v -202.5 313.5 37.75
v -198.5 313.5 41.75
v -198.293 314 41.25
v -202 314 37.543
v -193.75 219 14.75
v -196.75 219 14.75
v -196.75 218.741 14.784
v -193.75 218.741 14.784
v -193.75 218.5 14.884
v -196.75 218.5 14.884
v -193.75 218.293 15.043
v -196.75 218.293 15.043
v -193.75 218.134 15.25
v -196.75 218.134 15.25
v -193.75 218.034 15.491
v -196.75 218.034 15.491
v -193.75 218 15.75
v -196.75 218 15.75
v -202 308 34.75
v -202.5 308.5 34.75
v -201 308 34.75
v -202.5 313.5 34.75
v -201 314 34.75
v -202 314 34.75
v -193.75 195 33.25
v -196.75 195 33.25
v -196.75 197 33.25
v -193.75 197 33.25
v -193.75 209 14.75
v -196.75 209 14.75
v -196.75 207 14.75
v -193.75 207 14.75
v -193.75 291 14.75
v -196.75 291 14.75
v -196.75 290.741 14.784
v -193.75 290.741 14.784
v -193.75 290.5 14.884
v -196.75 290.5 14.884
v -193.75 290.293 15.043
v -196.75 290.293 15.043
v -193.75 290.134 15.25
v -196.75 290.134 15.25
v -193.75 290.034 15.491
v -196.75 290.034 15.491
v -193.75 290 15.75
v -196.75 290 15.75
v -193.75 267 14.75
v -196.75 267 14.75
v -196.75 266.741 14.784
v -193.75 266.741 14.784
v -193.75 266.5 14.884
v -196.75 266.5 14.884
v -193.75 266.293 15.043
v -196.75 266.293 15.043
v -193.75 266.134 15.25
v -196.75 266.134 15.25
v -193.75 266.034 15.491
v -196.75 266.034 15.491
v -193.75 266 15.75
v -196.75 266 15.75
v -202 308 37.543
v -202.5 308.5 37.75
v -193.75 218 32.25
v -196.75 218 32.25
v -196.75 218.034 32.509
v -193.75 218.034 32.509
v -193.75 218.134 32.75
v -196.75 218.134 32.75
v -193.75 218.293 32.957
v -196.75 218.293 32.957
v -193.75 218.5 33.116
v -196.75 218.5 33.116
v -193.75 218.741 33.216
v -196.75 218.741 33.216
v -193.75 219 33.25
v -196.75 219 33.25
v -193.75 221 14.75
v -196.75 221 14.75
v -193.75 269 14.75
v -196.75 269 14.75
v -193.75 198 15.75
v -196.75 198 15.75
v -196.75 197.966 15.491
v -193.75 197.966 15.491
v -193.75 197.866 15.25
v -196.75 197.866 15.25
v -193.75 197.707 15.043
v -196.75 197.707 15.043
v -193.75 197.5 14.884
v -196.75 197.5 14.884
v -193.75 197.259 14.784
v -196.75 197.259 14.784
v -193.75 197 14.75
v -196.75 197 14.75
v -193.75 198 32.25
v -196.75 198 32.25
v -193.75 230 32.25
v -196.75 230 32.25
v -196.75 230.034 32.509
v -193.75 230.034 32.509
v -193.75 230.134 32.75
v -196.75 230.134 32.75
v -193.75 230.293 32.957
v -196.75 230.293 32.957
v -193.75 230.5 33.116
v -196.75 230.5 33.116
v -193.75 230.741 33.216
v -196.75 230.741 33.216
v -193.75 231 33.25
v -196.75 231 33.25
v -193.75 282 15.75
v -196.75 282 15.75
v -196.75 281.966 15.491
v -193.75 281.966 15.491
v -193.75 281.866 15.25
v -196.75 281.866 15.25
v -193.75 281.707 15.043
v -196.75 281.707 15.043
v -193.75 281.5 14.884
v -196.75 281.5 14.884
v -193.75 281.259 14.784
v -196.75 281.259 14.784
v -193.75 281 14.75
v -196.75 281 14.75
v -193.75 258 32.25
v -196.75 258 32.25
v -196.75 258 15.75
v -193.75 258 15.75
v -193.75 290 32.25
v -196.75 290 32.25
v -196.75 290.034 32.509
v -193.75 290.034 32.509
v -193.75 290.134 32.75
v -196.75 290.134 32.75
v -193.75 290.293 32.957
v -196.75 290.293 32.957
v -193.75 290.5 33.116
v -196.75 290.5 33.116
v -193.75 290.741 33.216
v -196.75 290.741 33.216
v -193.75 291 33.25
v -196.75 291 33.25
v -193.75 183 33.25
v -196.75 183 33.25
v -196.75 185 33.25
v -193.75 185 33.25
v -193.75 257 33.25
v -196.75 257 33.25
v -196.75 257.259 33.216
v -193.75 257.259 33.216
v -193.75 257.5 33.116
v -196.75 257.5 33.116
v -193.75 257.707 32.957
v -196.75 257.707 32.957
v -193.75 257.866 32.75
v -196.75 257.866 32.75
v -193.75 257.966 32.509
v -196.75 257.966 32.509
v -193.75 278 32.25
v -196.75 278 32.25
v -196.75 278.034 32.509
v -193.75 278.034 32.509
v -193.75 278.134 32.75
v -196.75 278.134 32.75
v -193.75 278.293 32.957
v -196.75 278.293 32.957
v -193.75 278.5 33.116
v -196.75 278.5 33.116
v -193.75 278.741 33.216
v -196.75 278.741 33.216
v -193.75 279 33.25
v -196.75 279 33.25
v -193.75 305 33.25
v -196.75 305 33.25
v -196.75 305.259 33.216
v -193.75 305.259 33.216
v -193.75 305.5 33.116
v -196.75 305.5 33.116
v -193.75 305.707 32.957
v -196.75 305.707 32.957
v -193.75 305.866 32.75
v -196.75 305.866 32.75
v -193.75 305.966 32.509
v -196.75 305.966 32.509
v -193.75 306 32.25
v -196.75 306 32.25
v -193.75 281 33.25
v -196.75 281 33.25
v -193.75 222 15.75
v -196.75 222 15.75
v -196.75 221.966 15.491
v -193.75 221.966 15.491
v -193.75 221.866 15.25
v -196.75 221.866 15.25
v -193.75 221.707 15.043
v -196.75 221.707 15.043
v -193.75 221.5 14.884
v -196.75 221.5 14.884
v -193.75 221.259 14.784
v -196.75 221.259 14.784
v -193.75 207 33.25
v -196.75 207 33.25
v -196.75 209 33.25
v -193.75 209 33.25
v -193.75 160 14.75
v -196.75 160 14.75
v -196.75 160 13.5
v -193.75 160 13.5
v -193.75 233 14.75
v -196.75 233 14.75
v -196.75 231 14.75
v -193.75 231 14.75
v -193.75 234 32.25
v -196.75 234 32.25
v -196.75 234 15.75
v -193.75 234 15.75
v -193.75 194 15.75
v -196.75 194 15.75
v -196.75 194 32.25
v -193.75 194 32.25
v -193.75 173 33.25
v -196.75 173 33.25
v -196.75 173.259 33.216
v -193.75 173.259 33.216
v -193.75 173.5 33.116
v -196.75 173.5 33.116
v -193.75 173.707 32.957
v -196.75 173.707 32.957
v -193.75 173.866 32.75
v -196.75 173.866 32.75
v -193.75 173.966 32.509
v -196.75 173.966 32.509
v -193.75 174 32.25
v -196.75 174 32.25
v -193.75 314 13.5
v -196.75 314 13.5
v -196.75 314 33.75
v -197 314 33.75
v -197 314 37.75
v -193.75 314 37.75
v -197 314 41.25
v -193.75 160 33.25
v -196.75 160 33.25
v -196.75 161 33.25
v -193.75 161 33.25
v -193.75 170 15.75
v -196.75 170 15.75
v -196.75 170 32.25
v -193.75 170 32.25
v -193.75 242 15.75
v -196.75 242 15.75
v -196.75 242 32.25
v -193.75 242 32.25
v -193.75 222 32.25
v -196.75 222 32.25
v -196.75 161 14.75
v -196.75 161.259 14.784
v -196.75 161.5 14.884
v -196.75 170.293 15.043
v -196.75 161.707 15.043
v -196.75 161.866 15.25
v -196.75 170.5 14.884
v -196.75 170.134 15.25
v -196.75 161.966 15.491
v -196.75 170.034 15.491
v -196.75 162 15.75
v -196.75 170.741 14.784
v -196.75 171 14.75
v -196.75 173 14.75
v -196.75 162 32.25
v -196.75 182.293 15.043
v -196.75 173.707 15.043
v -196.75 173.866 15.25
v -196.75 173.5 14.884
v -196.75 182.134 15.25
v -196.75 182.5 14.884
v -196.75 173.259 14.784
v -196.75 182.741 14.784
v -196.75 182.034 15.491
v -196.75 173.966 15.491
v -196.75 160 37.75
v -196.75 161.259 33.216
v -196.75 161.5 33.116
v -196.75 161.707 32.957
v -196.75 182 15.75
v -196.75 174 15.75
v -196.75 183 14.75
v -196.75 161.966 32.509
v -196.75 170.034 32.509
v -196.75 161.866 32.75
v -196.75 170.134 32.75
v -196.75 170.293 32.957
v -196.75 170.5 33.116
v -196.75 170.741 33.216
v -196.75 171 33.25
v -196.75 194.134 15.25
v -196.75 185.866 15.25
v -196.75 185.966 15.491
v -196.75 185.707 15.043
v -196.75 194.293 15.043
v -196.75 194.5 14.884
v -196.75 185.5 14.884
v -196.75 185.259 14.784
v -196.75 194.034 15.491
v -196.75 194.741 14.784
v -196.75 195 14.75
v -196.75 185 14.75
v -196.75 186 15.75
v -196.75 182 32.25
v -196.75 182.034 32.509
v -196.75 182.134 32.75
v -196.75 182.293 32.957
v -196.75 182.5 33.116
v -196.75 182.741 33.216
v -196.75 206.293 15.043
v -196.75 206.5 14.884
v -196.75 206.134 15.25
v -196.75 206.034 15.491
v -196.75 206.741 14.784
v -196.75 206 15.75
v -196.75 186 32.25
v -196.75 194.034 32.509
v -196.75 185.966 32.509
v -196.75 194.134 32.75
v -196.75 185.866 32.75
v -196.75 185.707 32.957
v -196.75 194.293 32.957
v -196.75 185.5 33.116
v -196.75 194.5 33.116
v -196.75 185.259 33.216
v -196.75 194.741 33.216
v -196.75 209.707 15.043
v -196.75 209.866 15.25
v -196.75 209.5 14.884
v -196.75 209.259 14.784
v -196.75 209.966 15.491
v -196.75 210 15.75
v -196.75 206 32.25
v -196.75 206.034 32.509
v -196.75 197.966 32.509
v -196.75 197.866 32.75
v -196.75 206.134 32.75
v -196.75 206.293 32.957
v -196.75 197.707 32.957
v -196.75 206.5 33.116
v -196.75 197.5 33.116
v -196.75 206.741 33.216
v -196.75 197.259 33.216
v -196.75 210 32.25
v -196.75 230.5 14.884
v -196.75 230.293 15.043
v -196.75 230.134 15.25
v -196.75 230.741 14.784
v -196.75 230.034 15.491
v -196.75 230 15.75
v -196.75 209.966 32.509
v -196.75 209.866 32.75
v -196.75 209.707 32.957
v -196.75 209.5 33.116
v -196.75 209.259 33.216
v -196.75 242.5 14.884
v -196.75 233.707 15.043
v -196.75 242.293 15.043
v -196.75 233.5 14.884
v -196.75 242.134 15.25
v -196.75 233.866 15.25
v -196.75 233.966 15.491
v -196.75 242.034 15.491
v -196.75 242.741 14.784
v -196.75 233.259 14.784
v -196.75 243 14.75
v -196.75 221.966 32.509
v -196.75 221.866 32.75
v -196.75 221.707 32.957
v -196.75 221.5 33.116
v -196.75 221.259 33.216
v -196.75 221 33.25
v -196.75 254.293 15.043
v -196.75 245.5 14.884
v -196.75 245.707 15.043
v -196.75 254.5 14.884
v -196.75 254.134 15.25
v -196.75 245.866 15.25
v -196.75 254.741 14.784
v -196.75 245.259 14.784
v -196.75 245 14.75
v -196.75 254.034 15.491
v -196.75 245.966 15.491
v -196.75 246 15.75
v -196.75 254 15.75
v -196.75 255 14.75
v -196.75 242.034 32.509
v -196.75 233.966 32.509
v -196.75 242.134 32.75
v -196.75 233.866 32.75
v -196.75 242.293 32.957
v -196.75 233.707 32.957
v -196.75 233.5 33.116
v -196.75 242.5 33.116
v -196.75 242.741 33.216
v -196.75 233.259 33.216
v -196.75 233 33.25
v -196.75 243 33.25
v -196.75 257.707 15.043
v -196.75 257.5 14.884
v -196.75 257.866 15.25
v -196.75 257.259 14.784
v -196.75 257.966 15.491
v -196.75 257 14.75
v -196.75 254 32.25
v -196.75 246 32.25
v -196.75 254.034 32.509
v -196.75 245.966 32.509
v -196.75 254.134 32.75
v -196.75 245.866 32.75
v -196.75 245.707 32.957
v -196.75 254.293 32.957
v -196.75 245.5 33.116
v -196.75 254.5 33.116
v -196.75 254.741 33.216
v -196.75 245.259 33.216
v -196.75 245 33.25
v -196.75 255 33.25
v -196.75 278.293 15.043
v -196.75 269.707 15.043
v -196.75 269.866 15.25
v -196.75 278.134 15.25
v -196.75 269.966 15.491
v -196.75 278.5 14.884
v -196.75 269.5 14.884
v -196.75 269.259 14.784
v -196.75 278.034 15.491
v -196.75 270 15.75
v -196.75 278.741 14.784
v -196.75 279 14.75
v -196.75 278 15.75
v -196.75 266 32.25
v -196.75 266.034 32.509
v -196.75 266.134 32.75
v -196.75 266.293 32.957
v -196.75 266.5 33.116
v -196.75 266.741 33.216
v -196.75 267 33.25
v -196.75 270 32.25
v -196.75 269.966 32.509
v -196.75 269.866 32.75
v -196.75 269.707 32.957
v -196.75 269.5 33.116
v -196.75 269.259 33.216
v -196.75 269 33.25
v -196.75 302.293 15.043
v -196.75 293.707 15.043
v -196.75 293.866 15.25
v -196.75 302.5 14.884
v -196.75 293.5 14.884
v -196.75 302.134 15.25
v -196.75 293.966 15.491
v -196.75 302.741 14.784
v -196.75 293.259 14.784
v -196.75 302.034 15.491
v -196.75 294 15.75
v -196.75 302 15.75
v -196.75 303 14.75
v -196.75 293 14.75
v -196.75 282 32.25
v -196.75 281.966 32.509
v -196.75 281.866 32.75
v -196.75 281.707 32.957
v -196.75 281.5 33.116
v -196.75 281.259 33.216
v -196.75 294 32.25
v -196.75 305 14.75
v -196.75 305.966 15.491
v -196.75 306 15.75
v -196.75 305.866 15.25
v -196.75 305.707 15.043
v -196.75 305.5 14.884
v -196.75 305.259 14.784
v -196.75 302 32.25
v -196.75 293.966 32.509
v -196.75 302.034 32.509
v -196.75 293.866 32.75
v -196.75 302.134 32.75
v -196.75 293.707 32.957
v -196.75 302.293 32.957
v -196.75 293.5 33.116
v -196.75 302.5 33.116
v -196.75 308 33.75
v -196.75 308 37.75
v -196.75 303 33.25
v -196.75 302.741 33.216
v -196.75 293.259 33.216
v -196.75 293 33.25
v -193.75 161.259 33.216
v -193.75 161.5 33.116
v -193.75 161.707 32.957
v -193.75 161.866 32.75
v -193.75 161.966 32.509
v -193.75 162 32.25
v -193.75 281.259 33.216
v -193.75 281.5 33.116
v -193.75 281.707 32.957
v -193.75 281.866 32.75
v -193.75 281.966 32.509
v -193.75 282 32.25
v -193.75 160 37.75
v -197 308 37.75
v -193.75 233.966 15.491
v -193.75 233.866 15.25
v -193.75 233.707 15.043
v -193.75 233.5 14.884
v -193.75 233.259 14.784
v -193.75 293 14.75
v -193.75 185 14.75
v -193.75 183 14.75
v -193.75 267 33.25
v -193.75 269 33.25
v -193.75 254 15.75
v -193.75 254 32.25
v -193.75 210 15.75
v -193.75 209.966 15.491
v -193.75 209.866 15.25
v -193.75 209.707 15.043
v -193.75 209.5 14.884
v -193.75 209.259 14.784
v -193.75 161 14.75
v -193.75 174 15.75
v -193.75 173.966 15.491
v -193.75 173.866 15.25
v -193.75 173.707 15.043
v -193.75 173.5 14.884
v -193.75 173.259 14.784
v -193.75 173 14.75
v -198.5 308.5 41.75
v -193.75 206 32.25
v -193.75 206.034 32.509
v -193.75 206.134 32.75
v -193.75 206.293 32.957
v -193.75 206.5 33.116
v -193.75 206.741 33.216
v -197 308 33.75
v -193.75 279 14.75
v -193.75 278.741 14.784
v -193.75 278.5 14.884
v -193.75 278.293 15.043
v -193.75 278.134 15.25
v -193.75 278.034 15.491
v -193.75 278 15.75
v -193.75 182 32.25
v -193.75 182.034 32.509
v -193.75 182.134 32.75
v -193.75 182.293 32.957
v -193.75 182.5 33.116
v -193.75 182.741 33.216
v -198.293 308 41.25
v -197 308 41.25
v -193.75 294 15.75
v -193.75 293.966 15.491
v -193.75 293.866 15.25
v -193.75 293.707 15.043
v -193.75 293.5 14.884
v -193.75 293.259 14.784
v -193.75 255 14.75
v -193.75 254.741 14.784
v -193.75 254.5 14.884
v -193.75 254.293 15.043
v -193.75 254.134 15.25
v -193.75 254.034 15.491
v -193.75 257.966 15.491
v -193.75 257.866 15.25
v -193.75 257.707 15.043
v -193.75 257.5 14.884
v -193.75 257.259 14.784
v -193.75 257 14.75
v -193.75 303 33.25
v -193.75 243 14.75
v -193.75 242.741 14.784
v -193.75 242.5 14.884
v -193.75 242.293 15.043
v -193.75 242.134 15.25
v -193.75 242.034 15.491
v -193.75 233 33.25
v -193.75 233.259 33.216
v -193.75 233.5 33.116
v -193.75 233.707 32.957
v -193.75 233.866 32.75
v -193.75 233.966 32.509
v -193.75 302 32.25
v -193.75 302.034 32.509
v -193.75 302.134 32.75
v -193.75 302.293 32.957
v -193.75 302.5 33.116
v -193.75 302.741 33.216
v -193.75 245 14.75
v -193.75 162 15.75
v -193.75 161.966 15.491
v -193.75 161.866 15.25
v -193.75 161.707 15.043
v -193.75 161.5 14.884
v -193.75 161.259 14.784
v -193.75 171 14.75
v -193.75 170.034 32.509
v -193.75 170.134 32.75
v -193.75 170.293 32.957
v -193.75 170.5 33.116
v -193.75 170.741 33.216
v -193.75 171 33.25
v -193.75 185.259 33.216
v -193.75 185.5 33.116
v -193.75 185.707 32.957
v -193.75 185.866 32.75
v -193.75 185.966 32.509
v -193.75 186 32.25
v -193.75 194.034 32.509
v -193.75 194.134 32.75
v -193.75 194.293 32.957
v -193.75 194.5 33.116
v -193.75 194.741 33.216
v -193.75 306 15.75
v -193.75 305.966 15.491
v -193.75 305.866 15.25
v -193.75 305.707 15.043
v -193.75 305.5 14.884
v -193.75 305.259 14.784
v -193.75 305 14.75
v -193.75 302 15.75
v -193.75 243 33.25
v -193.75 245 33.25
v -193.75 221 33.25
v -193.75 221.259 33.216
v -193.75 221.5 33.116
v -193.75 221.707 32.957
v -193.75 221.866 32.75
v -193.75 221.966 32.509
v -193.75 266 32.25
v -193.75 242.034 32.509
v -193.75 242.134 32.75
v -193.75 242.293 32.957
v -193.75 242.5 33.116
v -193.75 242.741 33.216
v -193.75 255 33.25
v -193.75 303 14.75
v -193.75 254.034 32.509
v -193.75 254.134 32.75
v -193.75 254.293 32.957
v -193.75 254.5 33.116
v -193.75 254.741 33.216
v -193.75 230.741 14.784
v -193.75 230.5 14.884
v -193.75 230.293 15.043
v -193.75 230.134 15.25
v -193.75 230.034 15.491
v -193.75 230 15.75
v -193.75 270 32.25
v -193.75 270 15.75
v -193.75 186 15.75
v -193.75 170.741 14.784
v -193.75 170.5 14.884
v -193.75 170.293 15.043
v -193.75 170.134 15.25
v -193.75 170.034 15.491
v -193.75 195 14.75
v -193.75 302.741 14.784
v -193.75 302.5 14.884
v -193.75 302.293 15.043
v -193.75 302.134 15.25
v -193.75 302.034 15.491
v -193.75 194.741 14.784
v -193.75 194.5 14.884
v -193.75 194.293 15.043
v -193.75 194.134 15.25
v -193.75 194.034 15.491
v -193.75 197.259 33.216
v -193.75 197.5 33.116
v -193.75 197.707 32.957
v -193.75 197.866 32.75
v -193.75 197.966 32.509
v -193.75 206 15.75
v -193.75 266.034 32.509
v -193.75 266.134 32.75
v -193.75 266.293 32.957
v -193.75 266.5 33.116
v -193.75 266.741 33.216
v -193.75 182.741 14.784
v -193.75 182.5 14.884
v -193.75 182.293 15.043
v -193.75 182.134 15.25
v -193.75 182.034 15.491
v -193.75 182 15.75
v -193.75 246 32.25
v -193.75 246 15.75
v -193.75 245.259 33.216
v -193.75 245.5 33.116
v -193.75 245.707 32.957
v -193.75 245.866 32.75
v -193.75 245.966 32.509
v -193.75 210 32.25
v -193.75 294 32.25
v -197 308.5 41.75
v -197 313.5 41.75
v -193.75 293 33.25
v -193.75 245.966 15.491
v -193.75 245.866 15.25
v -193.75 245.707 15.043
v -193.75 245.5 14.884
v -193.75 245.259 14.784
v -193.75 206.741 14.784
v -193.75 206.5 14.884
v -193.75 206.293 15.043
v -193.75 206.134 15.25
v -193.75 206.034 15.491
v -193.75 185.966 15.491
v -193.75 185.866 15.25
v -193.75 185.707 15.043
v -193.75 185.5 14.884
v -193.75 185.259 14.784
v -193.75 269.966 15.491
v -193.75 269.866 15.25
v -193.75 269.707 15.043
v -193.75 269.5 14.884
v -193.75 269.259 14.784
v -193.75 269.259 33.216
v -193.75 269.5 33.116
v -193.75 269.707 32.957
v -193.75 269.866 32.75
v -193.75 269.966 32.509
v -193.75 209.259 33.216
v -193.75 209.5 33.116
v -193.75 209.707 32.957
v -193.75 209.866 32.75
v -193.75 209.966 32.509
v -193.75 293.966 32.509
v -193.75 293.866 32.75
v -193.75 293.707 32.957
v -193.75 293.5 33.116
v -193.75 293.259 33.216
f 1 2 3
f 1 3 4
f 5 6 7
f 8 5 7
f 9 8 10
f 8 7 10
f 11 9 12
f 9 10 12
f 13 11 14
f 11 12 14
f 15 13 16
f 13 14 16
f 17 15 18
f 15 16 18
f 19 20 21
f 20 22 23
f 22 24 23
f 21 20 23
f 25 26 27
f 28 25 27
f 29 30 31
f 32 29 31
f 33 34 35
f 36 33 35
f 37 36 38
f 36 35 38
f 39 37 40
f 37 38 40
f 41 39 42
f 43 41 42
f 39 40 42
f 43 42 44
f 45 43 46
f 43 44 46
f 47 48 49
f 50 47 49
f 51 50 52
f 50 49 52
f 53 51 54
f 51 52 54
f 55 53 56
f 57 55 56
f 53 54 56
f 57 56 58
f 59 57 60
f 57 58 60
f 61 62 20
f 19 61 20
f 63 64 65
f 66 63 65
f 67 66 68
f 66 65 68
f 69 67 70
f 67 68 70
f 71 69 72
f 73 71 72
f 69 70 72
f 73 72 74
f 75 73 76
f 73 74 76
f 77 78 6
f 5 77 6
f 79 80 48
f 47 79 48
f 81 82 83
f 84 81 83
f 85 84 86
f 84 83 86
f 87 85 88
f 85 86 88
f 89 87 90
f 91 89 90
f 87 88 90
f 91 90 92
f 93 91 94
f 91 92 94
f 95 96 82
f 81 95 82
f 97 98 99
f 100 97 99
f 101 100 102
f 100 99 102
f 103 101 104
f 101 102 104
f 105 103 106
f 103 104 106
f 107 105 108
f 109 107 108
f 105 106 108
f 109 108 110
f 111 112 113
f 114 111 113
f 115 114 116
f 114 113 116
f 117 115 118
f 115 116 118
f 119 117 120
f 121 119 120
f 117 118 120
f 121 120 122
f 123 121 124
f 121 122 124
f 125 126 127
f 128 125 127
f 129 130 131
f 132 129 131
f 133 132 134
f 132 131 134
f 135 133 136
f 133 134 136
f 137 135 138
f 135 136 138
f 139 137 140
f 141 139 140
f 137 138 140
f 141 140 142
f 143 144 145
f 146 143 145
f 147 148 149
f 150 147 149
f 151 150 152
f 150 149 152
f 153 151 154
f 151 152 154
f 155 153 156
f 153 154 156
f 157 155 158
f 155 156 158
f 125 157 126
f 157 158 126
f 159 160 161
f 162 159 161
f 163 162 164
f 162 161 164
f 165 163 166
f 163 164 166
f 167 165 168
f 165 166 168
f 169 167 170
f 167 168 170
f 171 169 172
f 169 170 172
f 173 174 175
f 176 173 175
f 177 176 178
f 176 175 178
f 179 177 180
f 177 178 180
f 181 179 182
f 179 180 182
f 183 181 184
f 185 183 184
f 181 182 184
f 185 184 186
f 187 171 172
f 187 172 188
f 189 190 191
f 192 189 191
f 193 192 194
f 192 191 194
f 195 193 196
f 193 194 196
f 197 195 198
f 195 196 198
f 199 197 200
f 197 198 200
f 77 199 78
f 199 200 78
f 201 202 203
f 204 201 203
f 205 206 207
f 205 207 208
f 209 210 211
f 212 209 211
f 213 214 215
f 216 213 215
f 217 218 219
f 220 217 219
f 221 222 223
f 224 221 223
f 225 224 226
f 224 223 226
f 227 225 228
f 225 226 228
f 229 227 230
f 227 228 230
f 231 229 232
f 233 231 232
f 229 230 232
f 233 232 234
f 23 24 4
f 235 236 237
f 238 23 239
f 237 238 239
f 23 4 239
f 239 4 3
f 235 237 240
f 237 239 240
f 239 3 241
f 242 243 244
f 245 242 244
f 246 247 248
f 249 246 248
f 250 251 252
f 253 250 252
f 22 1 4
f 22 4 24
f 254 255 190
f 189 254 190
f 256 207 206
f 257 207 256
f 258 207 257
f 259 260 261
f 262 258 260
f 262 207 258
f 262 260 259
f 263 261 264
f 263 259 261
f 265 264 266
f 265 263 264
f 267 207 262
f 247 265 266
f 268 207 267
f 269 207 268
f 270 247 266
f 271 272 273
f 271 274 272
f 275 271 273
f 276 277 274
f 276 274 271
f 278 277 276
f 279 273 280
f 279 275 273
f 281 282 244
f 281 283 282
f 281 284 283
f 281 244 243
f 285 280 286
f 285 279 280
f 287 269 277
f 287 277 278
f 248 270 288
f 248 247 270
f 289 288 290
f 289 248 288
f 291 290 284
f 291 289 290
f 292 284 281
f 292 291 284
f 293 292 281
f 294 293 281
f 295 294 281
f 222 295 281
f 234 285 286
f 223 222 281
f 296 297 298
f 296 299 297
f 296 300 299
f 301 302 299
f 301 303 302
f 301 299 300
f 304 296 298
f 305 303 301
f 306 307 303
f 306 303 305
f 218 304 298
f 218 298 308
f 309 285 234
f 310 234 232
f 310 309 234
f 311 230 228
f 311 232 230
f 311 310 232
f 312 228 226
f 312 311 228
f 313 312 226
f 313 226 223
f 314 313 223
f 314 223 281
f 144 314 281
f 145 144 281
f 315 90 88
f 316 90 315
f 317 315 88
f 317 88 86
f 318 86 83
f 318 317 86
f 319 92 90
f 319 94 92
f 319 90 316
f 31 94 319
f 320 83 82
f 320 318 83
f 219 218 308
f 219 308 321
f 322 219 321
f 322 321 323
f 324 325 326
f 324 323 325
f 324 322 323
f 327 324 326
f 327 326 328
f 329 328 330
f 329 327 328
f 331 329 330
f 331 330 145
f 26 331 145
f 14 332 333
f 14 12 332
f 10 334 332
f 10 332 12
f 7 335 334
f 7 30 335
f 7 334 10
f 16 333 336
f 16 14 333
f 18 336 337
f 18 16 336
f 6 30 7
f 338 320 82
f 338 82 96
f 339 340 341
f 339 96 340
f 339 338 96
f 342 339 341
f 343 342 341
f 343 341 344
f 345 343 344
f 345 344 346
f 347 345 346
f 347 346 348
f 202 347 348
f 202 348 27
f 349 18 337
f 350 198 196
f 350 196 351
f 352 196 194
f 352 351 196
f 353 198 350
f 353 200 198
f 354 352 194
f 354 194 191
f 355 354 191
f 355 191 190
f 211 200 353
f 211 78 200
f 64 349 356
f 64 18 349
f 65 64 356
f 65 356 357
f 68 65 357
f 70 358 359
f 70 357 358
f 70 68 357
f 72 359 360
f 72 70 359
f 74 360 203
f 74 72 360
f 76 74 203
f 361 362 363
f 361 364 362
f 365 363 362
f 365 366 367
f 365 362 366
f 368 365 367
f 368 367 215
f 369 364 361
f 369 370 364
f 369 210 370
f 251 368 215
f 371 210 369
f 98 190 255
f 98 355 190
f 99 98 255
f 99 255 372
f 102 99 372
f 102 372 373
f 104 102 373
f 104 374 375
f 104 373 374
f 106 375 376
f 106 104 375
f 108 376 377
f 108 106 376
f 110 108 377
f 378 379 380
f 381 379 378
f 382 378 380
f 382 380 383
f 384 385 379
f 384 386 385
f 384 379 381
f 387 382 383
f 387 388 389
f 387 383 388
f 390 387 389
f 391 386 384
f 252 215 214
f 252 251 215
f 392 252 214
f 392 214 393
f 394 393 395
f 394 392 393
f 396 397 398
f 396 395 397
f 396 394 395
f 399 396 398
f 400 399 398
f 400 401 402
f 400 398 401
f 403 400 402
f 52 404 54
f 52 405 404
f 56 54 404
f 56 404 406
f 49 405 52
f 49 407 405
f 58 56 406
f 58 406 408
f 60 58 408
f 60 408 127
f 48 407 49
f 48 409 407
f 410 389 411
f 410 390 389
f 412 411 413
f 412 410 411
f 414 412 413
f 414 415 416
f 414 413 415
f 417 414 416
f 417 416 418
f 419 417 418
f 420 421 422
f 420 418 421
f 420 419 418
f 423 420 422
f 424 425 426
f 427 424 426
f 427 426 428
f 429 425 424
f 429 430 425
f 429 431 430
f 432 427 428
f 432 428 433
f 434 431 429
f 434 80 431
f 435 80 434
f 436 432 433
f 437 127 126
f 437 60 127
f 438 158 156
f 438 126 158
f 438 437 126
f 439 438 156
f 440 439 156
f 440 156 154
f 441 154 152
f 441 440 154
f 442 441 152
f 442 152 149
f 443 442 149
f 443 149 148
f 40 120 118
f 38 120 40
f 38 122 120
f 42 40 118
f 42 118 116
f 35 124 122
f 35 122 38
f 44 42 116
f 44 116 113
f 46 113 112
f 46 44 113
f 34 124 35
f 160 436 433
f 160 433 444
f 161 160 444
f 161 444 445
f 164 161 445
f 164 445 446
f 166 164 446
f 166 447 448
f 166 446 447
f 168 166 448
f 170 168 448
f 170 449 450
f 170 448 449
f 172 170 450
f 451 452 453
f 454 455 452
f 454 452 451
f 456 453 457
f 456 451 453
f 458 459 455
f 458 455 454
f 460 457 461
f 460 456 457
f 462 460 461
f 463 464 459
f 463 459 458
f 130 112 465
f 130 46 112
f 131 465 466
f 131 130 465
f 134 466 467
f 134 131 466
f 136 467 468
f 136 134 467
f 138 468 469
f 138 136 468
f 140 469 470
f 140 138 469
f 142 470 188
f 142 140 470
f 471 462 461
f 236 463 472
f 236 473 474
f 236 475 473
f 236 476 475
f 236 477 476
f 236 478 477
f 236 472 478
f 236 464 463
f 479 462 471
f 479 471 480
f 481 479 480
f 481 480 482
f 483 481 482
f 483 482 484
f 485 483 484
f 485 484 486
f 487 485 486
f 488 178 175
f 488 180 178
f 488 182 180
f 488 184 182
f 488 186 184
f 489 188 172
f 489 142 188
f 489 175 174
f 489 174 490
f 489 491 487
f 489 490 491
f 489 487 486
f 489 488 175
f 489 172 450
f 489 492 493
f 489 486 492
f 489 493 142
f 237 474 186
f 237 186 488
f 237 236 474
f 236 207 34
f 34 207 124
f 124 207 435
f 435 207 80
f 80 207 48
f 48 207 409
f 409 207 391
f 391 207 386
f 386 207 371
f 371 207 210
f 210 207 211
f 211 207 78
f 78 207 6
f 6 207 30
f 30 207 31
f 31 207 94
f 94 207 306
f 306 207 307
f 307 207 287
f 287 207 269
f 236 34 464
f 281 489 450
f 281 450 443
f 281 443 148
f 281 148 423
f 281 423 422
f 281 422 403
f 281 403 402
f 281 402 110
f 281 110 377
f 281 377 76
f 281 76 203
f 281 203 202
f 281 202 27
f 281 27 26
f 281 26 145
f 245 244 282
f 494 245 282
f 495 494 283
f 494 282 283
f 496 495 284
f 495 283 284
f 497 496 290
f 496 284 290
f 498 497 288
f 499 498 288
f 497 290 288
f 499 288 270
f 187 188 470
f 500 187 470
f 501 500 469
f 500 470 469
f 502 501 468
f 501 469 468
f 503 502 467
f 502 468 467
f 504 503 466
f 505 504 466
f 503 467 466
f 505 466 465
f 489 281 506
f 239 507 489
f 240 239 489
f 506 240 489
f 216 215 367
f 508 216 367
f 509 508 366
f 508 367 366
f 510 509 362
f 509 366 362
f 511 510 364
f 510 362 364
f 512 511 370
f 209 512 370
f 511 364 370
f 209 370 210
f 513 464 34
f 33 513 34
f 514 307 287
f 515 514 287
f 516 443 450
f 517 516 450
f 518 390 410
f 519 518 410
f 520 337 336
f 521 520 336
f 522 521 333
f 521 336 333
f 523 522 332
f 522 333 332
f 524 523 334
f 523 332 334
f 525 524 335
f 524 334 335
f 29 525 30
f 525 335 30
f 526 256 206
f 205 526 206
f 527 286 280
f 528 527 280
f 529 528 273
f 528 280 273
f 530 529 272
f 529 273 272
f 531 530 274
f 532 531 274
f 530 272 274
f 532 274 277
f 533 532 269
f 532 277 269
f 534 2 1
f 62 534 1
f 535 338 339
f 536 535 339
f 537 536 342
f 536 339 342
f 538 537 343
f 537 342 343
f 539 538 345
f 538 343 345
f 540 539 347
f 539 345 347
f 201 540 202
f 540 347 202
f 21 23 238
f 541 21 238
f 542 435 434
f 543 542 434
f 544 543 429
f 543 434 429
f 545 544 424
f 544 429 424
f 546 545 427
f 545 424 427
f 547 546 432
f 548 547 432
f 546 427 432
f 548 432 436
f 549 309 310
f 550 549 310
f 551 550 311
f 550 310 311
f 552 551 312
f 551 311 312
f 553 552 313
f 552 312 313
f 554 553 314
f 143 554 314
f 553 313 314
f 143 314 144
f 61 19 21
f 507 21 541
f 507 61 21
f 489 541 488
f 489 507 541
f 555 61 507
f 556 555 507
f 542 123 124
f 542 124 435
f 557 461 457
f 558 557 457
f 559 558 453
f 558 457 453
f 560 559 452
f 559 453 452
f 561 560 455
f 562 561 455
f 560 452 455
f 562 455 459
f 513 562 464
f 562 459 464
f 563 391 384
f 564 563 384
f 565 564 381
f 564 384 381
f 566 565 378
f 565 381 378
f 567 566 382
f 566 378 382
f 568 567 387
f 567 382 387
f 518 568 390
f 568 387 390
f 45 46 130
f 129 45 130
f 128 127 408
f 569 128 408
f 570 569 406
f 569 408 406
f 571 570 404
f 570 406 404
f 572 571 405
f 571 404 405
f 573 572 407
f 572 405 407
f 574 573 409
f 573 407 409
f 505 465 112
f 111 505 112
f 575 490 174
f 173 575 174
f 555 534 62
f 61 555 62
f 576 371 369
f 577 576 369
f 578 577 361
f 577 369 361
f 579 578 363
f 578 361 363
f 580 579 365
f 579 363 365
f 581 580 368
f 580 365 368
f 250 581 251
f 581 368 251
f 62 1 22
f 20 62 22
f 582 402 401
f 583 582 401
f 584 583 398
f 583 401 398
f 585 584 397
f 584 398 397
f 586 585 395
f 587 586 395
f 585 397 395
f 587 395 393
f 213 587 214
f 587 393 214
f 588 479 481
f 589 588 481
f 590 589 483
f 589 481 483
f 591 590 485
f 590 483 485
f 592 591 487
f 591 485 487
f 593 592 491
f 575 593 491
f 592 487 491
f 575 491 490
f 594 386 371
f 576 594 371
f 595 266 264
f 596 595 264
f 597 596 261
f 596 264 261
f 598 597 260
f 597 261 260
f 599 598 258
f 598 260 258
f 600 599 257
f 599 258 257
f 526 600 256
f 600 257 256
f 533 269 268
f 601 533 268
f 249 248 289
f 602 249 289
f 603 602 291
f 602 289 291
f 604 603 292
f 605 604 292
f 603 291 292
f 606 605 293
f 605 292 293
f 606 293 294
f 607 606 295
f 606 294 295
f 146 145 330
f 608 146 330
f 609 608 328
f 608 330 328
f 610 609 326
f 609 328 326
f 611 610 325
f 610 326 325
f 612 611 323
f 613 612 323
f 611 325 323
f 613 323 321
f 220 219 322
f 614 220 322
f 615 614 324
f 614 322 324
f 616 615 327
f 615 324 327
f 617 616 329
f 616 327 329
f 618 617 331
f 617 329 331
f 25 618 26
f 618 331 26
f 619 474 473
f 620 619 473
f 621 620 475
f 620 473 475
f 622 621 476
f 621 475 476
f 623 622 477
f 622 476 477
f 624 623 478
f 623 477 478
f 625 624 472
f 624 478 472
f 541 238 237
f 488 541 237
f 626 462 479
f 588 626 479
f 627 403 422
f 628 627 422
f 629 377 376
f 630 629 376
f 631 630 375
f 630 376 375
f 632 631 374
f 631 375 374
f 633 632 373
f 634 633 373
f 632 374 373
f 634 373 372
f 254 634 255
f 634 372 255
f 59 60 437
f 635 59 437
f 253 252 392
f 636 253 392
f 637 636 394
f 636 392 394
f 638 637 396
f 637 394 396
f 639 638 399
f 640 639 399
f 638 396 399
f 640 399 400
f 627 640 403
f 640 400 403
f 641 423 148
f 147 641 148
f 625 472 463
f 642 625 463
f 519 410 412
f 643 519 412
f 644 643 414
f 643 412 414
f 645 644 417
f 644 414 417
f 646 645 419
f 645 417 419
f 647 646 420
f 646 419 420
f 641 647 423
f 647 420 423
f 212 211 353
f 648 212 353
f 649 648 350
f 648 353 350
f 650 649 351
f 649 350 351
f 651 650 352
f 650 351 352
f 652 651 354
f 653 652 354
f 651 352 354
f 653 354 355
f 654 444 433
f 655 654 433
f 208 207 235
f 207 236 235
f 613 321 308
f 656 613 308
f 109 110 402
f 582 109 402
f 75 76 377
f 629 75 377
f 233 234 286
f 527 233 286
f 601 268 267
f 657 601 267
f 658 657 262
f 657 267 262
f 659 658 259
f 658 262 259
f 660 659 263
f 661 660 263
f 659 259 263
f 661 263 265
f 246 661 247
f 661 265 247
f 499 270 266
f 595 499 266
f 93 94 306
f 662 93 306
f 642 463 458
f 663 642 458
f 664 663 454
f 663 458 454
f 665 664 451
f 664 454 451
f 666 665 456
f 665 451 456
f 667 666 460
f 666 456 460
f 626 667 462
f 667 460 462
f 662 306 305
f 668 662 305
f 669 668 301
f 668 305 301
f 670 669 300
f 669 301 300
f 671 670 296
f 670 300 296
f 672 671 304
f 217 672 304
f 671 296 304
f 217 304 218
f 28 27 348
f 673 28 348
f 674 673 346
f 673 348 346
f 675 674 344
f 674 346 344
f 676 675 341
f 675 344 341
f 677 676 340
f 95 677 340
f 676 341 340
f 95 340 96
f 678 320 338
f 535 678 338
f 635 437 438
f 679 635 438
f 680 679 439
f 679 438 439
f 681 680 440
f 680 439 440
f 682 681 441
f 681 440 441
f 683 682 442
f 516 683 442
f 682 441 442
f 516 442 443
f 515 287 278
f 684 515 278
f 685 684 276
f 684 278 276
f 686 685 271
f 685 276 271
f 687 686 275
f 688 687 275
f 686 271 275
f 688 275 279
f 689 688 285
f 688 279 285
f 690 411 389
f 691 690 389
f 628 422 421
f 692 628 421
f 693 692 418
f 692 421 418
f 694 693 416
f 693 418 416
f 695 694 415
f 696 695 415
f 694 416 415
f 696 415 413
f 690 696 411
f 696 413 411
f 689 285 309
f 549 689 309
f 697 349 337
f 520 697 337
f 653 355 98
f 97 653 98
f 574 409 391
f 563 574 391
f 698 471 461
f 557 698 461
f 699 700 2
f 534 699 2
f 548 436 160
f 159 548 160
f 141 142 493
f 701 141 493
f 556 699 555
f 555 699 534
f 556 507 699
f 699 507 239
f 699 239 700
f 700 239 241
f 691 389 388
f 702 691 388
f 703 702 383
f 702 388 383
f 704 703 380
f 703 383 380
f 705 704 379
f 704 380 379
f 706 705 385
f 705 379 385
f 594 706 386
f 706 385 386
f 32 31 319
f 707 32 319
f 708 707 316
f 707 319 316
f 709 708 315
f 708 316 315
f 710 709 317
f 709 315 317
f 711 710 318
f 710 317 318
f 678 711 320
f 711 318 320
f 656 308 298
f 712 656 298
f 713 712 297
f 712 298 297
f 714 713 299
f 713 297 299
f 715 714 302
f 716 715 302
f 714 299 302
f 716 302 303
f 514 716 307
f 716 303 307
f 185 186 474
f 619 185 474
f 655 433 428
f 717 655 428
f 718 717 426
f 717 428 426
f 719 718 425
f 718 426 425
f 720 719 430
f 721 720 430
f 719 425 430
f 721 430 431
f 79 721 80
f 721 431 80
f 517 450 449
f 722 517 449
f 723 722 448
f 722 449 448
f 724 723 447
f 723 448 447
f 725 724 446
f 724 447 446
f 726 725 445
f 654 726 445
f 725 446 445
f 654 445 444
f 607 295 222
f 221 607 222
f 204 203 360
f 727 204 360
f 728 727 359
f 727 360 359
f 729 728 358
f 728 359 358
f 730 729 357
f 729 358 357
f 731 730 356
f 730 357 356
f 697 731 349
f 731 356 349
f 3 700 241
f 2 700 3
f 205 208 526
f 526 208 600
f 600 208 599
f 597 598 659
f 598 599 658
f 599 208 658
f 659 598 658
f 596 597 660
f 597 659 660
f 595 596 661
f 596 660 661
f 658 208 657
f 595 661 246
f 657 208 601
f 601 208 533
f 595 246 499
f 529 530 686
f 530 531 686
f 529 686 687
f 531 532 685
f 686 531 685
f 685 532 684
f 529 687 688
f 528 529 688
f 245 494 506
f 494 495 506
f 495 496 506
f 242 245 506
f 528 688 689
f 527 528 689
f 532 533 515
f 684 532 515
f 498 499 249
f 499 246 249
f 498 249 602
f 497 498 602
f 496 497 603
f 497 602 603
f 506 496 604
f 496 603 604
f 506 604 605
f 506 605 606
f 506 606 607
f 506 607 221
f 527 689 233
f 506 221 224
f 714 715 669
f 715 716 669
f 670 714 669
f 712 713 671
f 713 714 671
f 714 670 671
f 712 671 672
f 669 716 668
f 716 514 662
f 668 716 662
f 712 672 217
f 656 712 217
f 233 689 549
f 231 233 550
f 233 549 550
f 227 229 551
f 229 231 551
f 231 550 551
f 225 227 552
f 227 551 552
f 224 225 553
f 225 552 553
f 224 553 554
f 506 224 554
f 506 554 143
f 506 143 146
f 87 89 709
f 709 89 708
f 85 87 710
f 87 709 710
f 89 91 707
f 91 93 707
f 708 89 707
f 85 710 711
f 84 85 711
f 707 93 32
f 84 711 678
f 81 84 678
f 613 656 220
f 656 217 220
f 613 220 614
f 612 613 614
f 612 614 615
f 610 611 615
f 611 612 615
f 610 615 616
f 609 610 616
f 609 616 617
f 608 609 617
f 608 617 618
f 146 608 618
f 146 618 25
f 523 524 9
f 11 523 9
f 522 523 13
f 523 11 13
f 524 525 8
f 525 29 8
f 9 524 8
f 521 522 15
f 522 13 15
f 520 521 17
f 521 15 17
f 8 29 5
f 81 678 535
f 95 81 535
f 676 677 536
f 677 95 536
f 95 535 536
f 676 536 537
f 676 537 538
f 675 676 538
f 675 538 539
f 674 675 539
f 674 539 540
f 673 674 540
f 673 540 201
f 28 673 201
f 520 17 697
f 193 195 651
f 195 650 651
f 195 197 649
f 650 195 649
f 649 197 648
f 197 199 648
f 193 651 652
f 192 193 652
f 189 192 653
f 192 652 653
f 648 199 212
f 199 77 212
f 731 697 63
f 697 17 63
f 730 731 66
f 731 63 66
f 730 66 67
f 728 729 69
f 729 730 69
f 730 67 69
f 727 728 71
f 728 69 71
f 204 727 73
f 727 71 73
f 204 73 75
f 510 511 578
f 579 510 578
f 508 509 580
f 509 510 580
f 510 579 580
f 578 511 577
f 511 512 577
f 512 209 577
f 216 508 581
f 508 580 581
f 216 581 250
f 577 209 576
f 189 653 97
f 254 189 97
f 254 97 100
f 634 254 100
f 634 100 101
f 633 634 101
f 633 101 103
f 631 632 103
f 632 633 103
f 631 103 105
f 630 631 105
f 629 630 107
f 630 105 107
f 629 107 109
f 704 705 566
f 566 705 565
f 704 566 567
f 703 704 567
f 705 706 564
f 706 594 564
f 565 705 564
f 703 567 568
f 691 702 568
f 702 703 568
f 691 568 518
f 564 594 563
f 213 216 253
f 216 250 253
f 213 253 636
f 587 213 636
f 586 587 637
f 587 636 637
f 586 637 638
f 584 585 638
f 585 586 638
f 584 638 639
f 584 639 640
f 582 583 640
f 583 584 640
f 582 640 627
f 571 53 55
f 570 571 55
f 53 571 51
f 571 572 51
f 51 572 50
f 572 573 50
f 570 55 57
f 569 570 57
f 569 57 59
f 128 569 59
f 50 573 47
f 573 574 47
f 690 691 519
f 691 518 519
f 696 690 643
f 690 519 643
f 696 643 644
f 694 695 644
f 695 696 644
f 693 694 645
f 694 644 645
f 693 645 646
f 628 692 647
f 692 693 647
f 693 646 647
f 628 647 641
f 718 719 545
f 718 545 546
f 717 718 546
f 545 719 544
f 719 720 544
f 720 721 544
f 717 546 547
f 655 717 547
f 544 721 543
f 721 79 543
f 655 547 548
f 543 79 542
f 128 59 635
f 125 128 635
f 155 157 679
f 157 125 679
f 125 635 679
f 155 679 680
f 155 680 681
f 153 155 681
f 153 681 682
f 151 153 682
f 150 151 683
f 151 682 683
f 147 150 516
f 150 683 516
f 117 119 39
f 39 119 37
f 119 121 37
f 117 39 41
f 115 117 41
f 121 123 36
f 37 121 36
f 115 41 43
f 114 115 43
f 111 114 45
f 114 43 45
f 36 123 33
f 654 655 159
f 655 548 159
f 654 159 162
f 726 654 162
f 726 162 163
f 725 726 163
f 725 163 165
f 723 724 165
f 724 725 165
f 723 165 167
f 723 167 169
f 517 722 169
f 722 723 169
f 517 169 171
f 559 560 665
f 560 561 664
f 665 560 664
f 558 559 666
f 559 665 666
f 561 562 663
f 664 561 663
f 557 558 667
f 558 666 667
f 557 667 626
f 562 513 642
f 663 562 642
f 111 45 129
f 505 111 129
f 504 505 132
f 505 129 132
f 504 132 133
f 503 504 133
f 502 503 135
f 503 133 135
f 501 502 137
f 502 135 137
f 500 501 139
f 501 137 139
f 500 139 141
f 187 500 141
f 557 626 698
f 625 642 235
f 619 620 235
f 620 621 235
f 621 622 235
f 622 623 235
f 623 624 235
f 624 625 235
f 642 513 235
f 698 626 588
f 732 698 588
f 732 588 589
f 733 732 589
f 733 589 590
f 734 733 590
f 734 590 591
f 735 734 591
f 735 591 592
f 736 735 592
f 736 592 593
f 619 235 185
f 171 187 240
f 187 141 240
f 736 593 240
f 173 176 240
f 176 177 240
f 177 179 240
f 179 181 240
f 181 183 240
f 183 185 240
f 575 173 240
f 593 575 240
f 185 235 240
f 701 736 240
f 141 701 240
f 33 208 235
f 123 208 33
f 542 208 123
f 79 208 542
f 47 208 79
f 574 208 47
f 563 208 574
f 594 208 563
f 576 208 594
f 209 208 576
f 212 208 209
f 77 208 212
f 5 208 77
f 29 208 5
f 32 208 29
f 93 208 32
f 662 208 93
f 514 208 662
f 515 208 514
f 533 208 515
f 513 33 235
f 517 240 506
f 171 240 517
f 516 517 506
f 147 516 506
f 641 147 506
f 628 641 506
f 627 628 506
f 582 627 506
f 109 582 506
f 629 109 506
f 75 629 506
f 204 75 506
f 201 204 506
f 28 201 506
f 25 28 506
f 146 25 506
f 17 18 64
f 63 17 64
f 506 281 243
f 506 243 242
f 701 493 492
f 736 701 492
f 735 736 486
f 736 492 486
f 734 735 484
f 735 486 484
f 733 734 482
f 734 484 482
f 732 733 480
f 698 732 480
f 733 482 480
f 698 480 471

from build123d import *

# Parameters (mm, degrees)
PAD006_DEPTH    = 6
SKETCH014_W     = 3
SKETCH014_H     = 24.25
PAD007_DEPTH    = 148
POCKET007_DEPTH = 3
CHAMFER002_SIZE = 0.5


with BuildPart() as part:
    # Sketch013 (on Face1 of CopyPocket007) → Pad006 (new body)
    with BuildSketch(Plane.XZ.offset(-98)):
        Polygon((-193.75, 37.75), (-197, 37.75), (-197, 41.75), (-198.5, 41.75), (-202.5, 37.75), (-202.5, 34.75), (-201, 34.75), (-197, 33.75), (-196.75, 33.75), (-196.75, 13.5), (-193.75, 13.5), align=None)
    extrude(amount=PAD006_DEPTH)

    # Sketch014 (on Face13 of Pad006) → Pad007 (join)
    with BuildSketch(Plane.XZ.offset(-92)):
        with Locations((-195.25, 25.625)):
            Rectangle(SKETCH014_W, SKETCH014_H)
    extrude(amount=PAD007_DEPTH)

    # Sketch015 (on Face14 of Pad007) → Pocket007 (cut)
    with BuildSketch(Plane(origin=(-196.75, 18, 0), x_dir=(0, -1, 0), z_dir=(-1, 0, 0))):
        with BuildLine():
            Line((-72, 32.25), (-72, 15.75))
            ThreePointArc((-72, 15.75), (-71.7071067812, 15.0428932188), (-71, 14.75))
            Line((-71, 14.75), (-69, 14.75))
            ThreePointArc((-69, 14.75), (-68.2928932188, 15.0428932188), (-68, 15.75))
            Line((-68, 15.75), (-68, 32.25))
            ThreePointArc((-68, 32.25), (-68.2928932188, 32.9571067812), (-69, 33.25))
            Line((-69, 33.25), (-71, 33.25))
            ThreePointArc((-71, 33.25), (-71.7071067812, 32.9571067812), (-72, 32.25))
        make_face()
        with BuildLine():
            Line((-60, 32.2499996536), (-60, 15.7499996536))
            ThreePointArc((-60, 15.7499996536), (-59.7071067812, 15.0428928724), (-59, 14.7499996536))
            Line((-59, 14.7499996536), (-57, 14.7499996536))
            ThreePointArc((-57, 14.7499996536), (-56.2928932188, 15.0428928724), (-56, 15.7499996536))
            Line((-56, 15.7499996536), (-56, 32.2499996536))
            ThreePointArc((-56, 32.2499996536), (-56.2928932188, 32.9571064348), (-57, 33.2499996536))
            Line((-57, 33.2499996536), (-59, 33.2499996536))
            ThreePointArc((-59, 33.2499996536), (-59.7071067812, 32.9571064348), (-60, 32.2499996536))
        make_face()
        with BuildLine():
            Line((-47.9999996732, 32.25), (-47.9999996732, 15.75))
            ThreePointArc((-47.9999996732, 15.75), (-47.7071064544, 15.0428932188), (-46.9999996732, 14.75))
            Line((-46.9999996732, 14.75), (-44.9999996732, 14.75))
            ThreePointArc((-44.9999996732, 14.75), (-44.292892892, 15.0428932188), (-43.9999996732, 15.75))
            Line((-43.9999996732, 15.75), (-43.9999996732, 32.25))
            ThreePointArc((-43.9999996732, 32.25), (-44.292892892, 32.9571067812), (-44.9999996732, 33.25))
            Line((-44.9999996732, 33.25), (-46.9999996732, 33.25))
            ThreePointArc((-46.9999996732, 33.25), (-47.7071064544, 32.9571067812), (-47.9999996732, 32.25))
        make_face()
        with BuildLine():
            Line((-36, 32.25), (-36, 15.75))
            ThreePointArc((-36, 15.75), (-35.7071067812, 15.0428932188), (-35, 14.75))
            Line((-35, 14.75), (-33, 14.75))
            ThreePointArc((-33, 14.75), (-32.2928932188, 15.0428932188), (-32, 15.75))
            Line((-32, 15.75), (-32, 32.25))
            ThreePointArc((-32, 32.25), (-32.2928932188, 32.9571067812), (-33, 33.25))
            Line((-33, 33.25), (-35, 33.25))
            ThreePointArc((-35, 33.25), (-35.7071067812, 32.9571067812), (-36, 32.25))
        make_face()
        with BuildLine():
            Line((-24, 32.25), (-24, 15.75))
            ThreePointArc((-24, 15.75), (-23.7071067812, 15.0428932188), (-23, 14.75))
            Line((-23, 14.75), (-21, 14.75))
            ThreePointArc((-21, 14.75), (-20.2928932188, 15.0428932188), (-20, 15.75))
            Line((-20, 15.75), (-20, 32.25))
            ThreePointArc((-20, 32.25), (-20.2928932188, 32.9571067812), (-21, 33.25))
            Line((-21, 33.25), (-23, 33.25))
            ThreePointArc((-23, 33.25), (-23.7071067812, 32.9571067812), (-24, 32.25))
        make_face()
        with BuildLine():
            Line((-11.9999996732, 32.25), (-11.9999996732, 15.75))
            ThreePointArc((-11.9999996732, 15.75), (-11.7071064544, 15.0428932188), (-10.9999996732, 14.75))
            Line((-10.9999996732, 14.75), (-8.9999996732, 14.75))
            ThreePointArc((-8.9999996732, 14.75), (-8.292892892, 15.0428932188), (-7.9999996732, 15.75))
            Line((-7.9999996732, 15.75), (-7.9999996732, 32.25))
            ThreePointArc((-7.9999996732, 32.25), (-8.292892892, 32.9571067812), (-8.9999996732, 33.25))
            Line((-8.9999996732, 33.25), (-10.9999996732, 33.25))
            ThreePointArc((-10.9999996732, 33.25), (-11.7071064544, 32.9571067812), (-11.9999996732, 32.25))
        make_face()
        with BuildLine():
            Line((0, 32.25), (0, 15.75))
            ThreePointArc((0, 15.75), (0.2928932188, 15.0428932188), (1, 14.75))
            Line((1, 14.75), (3, 14.75))
            ThreePointArc((3, 14.75), (3.7071067812, 15.0428932188), (4, 15.75))
            Line((4, 15.75), (4, 32.25))
            ThreePointArc((4, 32.25), (3.7071067812, 32.9571067812), (3, 33.25))
            Line((3, 33.25), (1, 33.25))
            ThreePointArc((1, 33.25), (0.2928932188, 32.9571067812), (0, 32.25))
        make_face()
        with BuildLine():
            Line((12, 32.25), (12, 15.75))
            ThreePointArc((12, 15.75), (12.2928932188, 15.0428932188), (13, 14.75))
            Line((13, 14.75), (15, 14.75))
            ThreePointArc((15, 14.75), (15.7071067812, 15.0428932188), (16, 15.75))
            Line((16, 15.75), (16, 32.25))
            ThreePointArc((16, 32.25), (15.7071067812, 32.9571067812), (15, 33.25))
            Line((15, 33.25), (13, 33.25))
            ThreePointArc((13, 33.25), (12.2928932188, 32.9571067812), (12, 32.25))
        make_face()
        with BuildLine():
            Line((24.0000003268, 32.25), (24.0000003268, 15.75))
            ThreePointArc((24.0000003268, 15.75), (24.2928935456, 15.0428932188), (25.0000003268, 14.75))
            Line((25.0000003268, 14.75), (27.0000003268, 14.75))
            ThreePointArc((27.0000003268, 14.75), (27.707107108, 15.0428932188), (28.0000003268, 15.75))
            Line((28.0000003268, 15.75), (28.0000003268, 32.25))
            ThreePointArc((28.0000003268, 32.25), (27.707107108, 32.9571067812), (27.0000003268, 33.25))
            Line((27.0000003268, 33.25), (25.0000003268, 33.25))
            ThreePointArc((25.0000003268, 33.25), (24.2928935456, 32.9571067812), (24.0000003268, 32.25))
        make_face()
        with BuildLine():
            Line((36.0000003268, 32.25), (36.0000003268, 15.75))
            ThreePointArc((36.0000003268, 15.75), (36.2928935456, 15.0428932188), (37.0000003268, 14.75))
            Line((37.0000003268, 14.75), (39.0000003268, 14.75))
            ThreePointArc((39.0000003268, 14.75), (39.707107108, 15.0428932188), (40.0000003268, 15.75))
            Line((40.0000003268, 15.75), (40.0000003268, 32.25))
            ThreePointArc((40.0000003268, 32.25), (39.707107108, 32.9571067812), (39.0000003268, 33.25))
            Line((39.0000003268, 33.25), (37.0000003268, 33.25))
            ThreePointArc((37.0000003268, 33.25), (36.2928935456, 32.9571067812), (36.0000003268, 32.25))
        make_face()
        with BuildLine():
            Line((48, 32.25), (48, 15.75))
            ThreePointArc((48, 15.75), (48.2928932188, 15.0428932188), (49, 14.75))
            Line((49, 14.75), (51, 14.75))
            ThreePointArc((51, 14.75), (51.7071067812, 15.0428932188), (52, 15.75))
            Line((52, 15.75), (52, 32.25))
            ThreePointArc((52, 32.25), (51.7071067812, 32.9571067812), (51, 33.25))
            Line((51, 33.25), (49, 33.25))
            ThreePointArc((49, 33.25), (48.2928932188, 32.9571067812), (48, 32.25))
        make_face()
        with BuildLine():
            Line((60.0000003268, 32.25), (60.0000003268, 15.75))
            ThreePointArc((60.0000003268, 15.75), (60.2928935456, 15.0428932188), (61.0000003268, 14.75))
            Line((61.0000003268, 14.75), (63.0000003268, 14.75))
            ThreePointArc((63.0000003268, 14.75), (63.707107108, 15.0428932188), (64.0000003268, 15.75))
            Line((64.0000003268, 15.75), (64.0000003268, 32.25))
            ThreePointArc((64.0000003268, 32.25), (63.707107108, 32.9571067812), (63.0000003268, 33.25))
            Line((63.0000003268, 33.25), (61.0000003268, 33.25))
            ThreePointArc((61.0000003268, 33.25), (60.2928935456, 32.9571067812), (60.0000003268, 32.25))
        make_face()
        with BuildLine():
            Line((72, 32.2499996536), (72, 15.7499996536))
            ThreePointArc((72, 15.7499996536), (72.2928932188, 15.0428928724), (73, 14.7499996536))
            Line((73, 14.7499996536), (75, 14.7499996536))
            ThreePointArc((75, 14.7499996536), (75.7071067812, 15.0428928724), (76, 15.7499996536))
            Line((76, 15.7499996536), (76, 32.2499996536))
            ThreePointArc((76, 32.2499996536), (75.7071067812, 32.9571064348), (75, 33.2499996536))
            Line((75, 33.2499996536), (73, 33.2499996536))
            ThreePointArc((73, 33.2499996536), (72.2928932188, 32.9571064348), (72, 32.2499996536))
        make_face()
    extrude(amount=-POCKET007_DEPTH, mode=Mode.SUBTRACT)

    # Chamfer002
    chamfer002_edges = [part.edges().sort_by_distance(p)[0] for p in [
        (-197.75, 92, 41.75),
        (-200.5, 92, 39.75),
        (-202.5, 92, 36.25),
        (-202.5, 98, 36.25),
        (-200.5, 98, 39.75),
        (-197.75, 98, 41.75),
    ]]
    chamfer(chamfer002_edges, length=CHAMFER002_SIZE)


with BuildPart() as part_1:
    # Body005 placement: moved
    add(part.part.moved(Location((0, 216, 0))))


solid = part_1.part
